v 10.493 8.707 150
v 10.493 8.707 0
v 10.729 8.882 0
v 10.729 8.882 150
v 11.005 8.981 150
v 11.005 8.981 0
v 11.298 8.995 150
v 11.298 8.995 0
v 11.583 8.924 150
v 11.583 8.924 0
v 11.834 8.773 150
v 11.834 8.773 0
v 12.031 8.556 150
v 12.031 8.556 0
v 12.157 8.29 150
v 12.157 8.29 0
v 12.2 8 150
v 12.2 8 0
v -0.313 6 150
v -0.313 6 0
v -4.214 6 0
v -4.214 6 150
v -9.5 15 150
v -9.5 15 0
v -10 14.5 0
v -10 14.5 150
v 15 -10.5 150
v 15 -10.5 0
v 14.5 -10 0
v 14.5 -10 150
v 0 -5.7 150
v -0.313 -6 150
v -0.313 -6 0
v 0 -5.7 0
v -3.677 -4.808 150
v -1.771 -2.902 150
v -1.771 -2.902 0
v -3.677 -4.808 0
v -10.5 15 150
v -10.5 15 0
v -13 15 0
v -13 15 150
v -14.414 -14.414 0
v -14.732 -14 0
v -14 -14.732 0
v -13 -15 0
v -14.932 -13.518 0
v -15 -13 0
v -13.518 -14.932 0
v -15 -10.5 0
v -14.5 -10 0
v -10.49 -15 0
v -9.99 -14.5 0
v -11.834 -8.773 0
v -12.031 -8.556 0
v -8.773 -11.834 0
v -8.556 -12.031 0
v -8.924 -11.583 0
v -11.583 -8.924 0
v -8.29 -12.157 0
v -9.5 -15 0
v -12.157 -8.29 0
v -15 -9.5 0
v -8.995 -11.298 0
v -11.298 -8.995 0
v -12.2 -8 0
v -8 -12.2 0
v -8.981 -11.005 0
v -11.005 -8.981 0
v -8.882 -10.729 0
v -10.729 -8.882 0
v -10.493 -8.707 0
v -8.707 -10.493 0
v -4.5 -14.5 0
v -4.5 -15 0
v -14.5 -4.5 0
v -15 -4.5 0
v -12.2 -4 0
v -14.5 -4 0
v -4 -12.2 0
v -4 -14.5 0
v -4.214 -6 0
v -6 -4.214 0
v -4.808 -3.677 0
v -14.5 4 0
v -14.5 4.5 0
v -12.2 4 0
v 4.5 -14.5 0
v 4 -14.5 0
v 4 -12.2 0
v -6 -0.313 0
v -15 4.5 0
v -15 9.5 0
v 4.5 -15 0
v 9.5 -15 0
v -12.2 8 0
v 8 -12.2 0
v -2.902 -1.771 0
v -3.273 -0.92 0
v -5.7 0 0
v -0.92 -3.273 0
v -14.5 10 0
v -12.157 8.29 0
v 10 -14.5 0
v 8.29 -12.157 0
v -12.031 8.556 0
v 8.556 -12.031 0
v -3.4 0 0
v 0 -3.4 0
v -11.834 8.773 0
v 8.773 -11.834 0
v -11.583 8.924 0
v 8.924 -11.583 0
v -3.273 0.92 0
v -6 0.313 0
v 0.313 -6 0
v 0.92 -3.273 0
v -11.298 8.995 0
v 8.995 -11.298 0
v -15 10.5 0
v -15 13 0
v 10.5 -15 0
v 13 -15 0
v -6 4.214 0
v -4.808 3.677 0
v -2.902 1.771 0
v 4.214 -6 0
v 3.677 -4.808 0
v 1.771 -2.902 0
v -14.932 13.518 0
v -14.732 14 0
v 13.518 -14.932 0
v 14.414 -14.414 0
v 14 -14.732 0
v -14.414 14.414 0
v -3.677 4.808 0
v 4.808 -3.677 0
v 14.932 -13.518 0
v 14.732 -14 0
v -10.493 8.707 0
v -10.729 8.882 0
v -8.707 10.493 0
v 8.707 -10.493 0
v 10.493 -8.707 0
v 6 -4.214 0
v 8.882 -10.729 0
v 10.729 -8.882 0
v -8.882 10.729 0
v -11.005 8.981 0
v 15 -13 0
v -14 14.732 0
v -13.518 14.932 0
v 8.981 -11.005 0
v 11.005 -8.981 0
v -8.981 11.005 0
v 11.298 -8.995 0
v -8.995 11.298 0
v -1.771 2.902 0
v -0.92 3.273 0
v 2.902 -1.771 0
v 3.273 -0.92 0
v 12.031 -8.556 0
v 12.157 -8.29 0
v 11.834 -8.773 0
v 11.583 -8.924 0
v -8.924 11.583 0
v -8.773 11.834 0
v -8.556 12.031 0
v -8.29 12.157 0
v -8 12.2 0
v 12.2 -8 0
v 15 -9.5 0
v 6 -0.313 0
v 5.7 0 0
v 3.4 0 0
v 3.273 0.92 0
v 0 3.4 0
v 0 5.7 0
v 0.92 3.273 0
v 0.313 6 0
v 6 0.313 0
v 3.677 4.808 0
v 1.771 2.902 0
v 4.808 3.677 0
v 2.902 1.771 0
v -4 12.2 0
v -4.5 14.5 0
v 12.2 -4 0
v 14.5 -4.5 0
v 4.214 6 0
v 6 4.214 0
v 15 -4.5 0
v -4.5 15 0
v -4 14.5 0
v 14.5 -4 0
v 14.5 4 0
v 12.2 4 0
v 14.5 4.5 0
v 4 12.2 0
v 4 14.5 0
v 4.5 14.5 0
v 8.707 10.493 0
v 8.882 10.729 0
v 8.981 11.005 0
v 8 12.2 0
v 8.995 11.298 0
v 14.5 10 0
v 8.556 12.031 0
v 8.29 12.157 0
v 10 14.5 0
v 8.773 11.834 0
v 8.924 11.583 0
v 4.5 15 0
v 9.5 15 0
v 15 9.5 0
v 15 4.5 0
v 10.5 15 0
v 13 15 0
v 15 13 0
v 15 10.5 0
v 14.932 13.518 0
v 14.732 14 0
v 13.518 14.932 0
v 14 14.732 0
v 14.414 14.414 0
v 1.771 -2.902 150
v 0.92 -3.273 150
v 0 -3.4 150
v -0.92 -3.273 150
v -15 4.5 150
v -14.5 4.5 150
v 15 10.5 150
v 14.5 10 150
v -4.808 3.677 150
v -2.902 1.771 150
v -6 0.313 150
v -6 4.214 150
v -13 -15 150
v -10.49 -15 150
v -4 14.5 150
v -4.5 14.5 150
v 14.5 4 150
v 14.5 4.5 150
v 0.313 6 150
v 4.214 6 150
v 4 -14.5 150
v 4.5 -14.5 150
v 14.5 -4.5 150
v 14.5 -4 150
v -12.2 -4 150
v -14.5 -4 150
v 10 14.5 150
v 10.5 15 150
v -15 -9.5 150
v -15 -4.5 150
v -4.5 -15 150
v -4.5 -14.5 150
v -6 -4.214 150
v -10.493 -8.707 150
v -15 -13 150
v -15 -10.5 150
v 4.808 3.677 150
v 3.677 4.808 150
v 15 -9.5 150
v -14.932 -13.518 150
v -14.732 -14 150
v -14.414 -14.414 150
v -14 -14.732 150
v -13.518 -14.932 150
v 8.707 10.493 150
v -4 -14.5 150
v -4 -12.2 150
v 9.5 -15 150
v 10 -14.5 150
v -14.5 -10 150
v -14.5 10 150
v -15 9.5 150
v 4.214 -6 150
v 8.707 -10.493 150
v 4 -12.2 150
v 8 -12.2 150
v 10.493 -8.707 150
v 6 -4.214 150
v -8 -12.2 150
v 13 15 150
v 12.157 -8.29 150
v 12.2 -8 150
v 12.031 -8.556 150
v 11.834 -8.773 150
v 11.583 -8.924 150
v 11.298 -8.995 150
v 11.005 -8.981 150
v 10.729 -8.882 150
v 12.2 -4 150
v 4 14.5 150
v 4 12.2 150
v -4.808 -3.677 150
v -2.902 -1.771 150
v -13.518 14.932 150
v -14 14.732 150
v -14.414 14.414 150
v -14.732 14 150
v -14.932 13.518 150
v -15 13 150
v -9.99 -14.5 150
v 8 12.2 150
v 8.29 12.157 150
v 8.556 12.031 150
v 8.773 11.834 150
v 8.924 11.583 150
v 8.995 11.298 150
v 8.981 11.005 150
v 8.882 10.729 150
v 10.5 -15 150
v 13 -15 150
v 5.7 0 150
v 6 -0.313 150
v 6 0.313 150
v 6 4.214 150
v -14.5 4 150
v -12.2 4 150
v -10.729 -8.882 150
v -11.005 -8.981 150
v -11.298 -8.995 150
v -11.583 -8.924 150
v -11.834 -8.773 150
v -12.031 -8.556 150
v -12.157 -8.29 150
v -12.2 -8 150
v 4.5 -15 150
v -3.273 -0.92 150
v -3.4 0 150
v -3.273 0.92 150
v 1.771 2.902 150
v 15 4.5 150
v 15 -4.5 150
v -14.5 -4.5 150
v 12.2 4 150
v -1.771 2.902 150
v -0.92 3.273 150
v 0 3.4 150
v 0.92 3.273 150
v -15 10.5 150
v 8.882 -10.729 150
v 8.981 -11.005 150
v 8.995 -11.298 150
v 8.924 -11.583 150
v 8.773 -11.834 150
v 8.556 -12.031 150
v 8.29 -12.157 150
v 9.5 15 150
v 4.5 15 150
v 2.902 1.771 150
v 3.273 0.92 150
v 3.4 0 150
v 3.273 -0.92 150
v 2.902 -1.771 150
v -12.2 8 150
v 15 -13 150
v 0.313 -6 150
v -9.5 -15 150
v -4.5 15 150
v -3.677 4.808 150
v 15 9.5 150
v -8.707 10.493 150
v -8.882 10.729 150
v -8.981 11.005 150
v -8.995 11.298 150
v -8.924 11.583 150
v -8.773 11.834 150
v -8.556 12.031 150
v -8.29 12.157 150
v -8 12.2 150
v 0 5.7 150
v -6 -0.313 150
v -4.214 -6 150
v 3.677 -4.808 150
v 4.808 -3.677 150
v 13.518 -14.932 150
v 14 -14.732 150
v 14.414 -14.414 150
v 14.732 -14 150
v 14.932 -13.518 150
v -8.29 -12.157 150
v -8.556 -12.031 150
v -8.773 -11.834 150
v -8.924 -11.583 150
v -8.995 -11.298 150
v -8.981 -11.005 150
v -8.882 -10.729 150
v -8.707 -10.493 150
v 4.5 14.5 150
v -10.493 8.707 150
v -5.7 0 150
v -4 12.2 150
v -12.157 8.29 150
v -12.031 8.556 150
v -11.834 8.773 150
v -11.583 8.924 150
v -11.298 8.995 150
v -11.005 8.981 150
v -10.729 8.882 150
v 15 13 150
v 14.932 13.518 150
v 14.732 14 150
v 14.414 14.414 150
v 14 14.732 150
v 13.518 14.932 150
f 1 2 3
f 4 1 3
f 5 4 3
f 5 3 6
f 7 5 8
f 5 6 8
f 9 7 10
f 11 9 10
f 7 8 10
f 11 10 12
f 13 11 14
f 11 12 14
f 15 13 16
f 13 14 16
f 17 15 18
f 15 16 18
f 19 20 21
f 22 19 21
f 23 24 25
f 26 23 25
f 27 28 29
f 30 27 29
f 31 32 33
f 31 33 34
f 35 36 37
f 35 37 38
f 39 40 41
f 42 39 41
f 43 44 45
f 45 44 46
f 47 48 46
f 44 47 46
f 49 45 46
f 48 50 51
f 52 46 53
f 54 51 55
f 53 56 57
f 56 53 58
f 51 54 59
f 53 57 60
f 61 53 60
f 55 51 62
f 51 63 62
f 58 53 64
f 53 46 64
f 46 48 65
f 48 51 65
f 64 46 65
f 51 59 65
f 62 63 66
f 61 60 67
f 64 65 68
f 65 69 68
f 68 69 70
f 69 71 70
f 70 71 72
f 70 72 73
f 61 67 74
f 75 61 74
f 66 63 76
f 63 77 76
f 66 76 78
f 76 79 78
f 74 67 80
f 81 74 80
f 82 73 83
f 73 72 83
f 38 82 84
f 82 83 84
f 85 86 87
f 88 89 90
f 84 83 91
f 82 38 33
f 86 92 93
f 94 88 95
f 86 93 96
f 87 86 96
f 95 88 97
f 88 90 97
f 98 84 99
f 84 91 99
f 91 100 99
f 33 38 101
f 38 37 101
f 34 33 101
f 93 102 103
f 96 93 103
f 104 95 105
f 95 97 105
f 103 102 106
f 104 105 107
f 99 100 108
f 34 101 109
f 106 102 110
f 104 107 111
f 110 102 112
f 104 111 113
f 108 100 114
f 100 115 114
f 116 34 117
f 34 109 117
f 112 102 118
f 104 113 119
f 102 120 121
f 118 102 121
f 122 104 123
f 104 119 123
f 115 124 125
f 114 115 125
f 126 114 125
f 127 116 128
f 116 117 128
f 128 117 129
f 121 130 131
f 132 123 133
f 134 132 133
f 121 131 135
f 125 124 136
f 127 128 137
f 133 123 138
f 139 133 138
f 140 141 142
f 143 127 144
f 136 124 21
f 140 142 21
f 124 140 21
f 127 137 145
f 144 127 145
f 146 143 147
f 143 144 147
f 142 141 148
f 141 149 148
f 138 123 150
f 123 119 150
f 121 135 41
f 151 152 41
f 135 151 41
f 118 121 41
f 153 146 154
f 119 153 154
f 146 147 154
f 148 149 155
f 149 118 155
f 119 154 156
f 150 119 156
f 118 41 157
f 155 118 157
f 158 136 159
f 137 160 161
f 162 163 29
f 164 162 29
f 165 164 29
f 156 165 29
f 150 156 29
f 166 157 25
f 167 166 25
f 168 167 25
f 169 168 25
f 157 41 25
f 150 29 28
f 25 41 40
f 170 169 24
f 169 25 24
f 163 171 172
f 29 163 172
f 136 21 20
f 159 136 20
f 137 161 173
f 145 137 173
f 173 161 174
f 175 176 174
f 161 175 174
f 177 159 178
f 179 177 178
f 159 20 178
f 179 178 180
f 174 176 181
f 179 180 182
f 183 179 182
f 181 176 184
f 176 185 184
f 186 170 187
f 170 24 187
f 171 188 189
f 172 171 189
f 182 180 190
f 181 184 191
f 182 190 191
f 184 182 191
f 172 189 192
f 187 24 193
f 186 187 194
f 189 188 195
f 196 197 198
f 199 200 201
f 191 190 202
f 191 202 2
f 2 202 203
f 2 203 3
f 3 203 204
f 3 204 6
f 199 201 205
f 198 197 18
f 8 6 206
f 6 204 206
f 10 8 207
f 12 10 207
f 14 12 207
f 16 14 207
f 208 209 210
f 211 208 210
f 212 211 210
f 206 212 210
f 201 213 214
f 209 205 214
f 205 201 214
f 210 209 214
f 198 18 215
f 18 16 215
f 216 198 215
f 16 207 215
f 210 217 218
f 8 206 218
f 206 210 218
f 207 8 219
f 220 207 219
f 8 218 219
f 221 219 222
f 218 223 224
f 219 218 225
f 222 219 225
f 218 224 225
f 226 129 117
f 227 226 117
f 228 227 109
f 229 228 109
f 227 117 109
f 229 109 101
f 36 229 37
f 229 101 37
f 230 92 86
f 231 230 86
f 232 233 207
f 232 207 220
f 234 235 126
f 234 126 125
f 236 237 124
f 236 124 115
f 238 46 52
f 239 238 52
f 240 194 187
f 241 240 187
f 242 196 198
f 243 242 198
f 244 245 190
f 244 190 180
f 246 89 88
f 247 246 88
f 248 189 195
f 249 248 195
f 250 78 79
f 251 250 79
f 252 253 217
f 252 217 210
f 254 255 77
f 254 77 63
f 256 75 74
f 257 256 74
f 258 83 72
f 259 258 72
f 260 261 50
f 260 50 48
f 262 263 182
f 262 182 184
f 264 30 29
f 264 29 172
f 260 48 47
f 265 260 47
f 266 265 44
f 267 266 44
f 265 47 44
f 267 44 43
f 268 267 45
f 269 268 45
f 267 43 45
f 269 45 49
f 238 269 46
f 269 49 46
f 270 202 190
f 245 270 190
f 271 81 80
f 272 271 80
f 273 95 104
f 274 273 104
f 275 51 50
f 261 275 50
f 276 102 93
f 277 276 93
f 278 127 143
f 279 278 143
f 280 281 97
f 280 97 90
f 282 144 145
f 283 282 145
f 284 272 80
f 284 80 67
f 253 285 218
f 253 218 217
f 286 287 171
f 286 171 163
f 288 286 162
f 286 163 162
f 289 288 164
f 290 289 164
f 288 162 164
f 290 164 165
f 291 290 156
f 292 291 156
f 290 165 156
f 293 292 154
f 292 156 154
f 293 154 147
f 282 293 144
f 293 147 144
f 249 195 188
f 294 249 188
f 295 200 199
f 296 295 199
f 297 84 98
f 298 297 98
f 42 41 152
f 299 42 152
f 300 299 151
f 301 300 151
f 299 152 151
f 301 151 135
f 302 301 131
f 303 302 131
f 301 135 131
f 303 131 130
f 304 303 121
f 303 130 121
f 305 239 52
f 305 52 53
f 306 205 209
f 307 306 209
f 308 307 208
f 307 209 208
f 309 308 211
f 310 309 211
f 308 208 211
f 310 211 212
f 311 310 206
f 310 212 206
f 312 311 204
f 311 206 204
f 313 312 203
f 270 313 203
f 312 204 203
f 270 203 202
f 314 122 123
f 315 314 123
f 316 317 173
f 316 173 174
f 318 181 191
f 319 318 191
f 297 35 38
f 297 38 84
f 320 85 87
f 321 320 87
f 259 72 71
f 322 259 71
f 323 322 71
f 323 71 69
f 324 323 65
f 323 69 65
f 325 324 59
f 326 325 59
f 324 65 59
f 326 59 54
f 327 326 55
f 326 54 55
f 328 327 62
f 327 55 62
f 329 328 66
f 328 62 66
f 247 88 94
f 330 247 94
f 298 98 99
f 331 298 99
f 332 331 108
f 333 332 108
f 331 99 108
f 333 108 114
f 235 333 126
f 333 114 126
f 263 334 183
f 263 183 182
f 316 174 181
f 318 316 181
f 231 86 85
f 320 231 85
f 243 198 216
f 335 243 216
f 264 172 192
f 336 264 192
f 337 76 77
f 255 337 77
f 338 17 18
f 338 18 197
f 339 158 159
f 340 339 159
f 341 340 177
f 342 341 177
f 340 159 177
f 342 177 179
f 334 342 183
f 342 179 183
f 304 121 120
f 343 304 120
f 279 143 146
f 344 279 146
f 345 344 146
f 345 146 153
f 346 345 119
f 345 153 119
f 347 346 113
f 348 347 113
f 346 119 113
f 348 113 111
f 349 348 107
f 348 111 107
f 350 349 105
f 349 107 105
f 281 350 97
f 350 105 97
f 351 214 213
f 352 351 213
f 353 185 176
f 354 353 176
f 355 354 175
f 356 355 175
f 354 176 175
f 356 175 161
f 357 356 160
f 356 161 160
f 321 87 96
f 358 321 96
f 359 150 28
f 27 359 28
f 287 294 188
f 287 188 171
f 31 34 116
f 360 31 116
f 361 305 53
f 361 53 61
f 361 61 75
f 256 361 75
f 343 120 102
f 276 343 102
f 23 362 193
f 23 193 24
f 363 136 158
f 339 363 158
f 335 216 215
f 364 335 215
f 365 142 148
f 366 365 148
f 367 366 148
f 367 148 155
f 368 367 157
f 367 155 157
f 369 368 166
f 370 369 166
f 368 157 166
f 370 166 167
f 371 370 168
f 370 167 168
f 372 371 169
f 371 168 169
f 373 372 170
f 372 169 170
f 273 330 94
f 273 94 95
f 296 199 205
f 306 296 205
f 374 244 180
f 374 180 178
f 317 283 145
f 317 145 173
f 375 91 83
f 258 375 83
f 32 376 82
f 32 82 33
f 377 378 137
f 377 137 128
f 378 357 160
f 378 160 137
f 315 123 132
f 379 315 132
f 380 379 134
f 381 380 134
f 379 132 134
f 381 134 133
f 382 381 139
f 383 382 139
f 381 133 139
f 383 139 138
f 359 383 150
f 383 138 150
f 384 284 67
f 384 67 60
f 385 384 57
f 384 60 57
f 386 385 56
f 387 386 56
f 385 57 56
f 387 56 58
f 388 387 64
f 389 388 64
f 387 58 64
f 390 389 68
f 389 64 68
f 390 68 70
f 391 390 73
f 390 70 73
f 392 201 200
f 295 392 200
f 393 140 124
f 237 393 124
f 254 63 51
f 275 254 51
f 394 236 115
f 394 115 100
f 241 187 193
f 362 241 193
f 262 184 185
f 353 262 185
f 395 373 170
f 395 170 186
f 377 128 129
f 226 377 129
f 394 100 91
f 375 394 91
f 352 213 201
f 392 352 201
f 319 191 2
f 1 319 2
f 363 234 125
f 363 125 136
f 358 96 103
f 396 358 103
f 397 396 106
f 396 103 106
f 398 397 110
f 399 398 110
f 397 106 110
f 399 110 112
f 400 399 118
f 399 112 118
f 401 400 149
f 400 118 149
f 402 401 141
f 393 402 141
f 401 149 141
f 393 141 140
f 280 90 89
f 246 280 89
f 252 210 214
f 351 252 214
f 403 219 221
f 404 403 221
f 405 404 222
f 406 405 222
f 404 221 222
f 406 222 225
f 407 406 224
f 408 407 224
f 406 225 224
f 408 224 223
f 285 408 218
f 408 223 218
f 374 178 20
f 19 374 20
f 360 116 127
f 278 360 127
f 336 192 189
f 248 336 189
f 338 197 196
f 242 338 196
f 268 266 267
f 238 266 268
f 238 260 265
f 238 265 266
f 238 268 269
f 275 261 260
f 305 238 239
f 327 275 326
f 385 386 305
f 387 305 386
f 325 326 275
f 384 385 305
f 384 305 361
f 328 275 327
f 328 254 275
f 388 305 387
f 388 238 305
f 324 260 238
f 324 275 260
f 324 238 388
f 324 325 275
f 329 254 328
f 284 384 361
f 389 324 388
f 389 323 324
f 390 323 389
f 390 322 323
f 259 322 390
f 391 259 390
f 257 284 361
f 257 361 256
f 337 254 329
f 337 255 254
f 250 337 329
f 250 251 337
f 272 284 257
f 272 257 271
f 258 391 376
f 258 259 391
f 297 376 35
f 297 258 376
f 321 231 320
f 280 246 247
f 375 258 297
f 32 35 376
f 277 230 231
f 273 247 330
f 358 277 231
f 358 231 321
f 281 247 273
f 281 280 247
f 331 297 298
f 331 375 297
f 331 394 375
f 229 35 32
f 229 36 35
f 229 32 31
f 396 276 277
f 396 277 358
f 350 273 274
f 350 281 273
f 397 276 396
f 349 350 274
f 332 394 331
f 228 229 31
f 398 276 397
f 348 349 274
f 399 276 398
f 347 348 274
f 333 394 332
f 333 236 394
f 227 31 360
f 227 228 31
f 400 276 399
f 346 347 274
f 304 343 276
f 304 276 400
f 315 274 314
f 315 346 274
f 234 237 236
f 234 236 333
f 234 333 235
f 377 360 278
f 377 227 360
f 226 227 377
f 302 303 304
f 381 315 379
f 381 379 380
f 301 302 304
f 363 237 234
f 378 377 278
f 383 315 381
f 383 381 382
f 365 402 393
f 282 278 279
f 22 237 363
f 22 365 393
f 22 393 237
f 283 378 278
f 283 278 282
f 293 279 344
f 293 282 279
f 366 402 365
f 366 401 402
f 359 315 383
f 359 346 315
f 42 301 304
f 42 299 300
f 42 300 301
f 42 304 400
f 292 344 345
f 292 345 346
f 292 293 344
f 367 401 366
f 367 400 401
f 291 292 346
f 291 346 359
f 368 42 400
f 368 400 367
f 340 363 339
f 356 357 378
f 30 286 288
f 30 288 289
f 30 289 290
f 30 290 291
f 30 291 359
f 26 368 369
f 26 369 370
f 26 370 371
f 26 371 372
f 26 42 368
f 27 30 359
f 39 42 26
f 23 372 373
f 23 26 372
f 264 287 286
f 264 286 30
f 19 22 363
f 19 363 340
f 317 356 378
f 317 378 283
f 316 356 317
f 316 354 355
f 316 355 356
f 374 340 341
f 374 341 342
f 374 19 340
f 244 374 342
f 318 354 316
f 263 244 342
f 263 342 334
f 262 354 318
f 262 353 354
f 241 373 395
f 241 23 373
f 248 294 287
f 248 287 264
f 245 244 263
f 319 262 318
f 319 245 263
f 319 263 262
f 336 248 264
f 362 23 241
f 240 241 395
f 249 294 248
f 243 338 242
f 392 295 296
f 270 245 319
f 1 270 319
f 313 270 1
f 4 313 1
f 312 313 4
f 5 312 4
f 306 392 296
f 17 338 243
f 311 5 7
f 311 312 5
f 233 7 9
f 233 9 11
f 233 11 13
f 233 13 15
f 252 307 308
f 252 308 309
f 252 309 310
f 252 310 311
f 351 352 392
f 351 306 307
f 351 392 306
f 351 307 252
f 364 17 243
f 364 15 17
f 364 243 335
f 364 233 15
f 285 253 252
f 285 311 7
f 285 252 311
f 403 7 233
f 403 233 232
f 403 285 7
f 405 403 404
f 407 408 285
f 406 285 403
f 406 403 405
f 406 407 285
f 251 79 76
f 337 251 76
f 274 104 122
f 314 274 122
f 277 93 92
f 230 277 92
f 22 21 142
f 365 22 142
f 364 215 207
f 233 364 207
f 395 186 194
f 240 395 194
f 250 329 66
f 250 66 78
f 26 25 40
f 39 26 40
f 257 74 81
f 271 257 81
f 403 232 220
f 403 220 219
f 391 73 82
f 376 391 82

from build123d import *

# Parameters (mm, degrees)
BOSS_EXTRUDE1_DEPTH = 150


with BuildPart() as part:
    # Sketch1 → Boss-Extrude1 (new body)
    with BuildSketch(Plane.XY):
        with BuildLine():
            Line((12.999999999, 14.999999999), (10.499999999, 14.999999999))
            Line((10.499999999, 14.999999999), (9.999999999, 14.499999999))
            Line((9.999999999, 14.499999999), (9.5, 14.999999999))
            Line((9.5, 14.999999999), (4.5, 14.999999999))
            Line((4.5, 14.999999999), (4.5, 14.5))
            Line((4.5, 14.5), (4, 14.5))
            Line((4, 14.5), (4, 12.200000005))
            Line((4, 12.200000005), (7.999999994, 12.200000005))
            ThreePointArc((7.999999994, 12.200000005), (8.923879532, 11.582683434), (8.707106779, 10.492893215))
            Line((8.707106779, 10.492893215), (4.214213564, 6))
            Line((4.214213564, 6), (0.312520901, 6))
            Line((0.312520901, 6), (0, 5.7))
            Line((0, 5.7), (-0.312520903, 6))
            Line((-0.312520903, 6), (-4.214213564, 6))
            Line((-4.214213564, 6), (-8.70710678, 10.492893215))
            ThreePointArc((-8.70710678, 10.492893215), (-8.923879532, 11.582683434), (-7.999999995, 12.200000005))
            Line((-7.999999995, 12.200000005), (-4, 12.200000005))
            Line((-4, 12.200000005), (-4, 14.5))
            Line((-4, 14.5), (-4.5, 14.5))
            Line((-4.5, 14.5), (-4.5, 14.999999999))
            Line((-4.5, 14.999999999), (-9.500000003, 14.999999999))
            Line((-9.500000003, 14.999999999), (-10.000000002, 14.499999999))
            Line((-10.000000002, 14.499999999), (-10.500000001, 14.999999999))
            Line((-10.500000001, 14.999999999), (-13, 14.999999999))
            ThreePointArc((-13, 14.999999999), (-14.414213562, 14.414213561), (-15, 12.999999999))
            Line((-15, 12.999999999), (-15, 10.5))
            Line((-15, 10.5), (-14.500000001, 10.000000001))
            Line((-14.500000001, 10.000000001), (-15, 9.500000001))
            Line((-15, 9.500000001), (-15, 4.5))
            Line((-15, 4.5), (-14.5, 4.5))
            Line((-14.5, 4.5), (-14.5, 4))
            Line((-14.5, 4), (-12.200000005, 4))
            Line((-12.200000005, 4), (-12.200000005, 7.999999994))
            ThreePointArc((-12.200000005, 7.999999994), (-11.582683434, 8.923879532), (-10.492893215, 8.707106779))
            Line((-10.492893215, 8.707106779), (-6, 4.214213564))
            Line((-6, 4.214213564), (-6, 0.312520901))
            Line((-6, 0.312520901), (-5.7, 0))
            Line((-5.7, 0), (-6, -0.312520903))
            Line((-6, -0.312520903), (-6, -4.214213564))
            Line((-6, -4.214213564), (-10.492893215, -8.70710678))
            ThreePointArc((-10.492893215, -8.70710678), (-11.582683434, -8.923879532), (-12.200000005, -7.999999995))
            Line((-12.200000005, -7.999999995), (-12.200000005, -4))
            Line((-12.200000005, -4), (-14.5, -4))
            Line((-14.5, -4), (-14.5, -4.5))
            Line((-14.5, -4.5), (-15, -4.5))
            Line((-15, -4.5), (-15, -9.500000001))
            Line((-15, -9.500000001), (-14.500000001, -10.000000001))
            Line((-14.500000001, -10.000000001), (-15, -10.5))
            Line((-15, -10.5), (-15, -13))
            ThreePointArc((-15, -13), (-14.414213562, -14.414213562), (-13, -15))
            Line((-13, -15), (-10.489897949, -15))
            Line((-10.489897949, -15), (-9.989897949, -14.5))
            Line((-9.989897949, -14.5), (-9.500000001, -15))
            Line((-9.500000001, -15), (-4.5, -15))
            Line((-4.5, -15), (-4.5, -14.5))
            Line((-4.5, -14.5), (-4, -14.5))
            Line((-4, -14.5), (-4, -12.200000005))
            Line((-4, -12.200000005), (-7.999999995, -12.200000005))
            ThreePointArc((-7.999999995, -12.200000005), (-8.923879532, -11.582683434), (-8.70710678, -10.492893215))
            Line((-8.70710678, -10.492893215), (-4.214213564, -6))
            Line((-4.214213564, -6), (-0.312520901, -6))
            Line((-0.312520901, -6), (0, -5.7))
            Line((0, -5.7), (0.312520903, -6))
            Line((0.312520903, -6), (4.214213564, -6))
            Line((4.214213564, -6), (8.70710678, -10.492893215))
            ThreePointArc((8.70710678, -10.492893215), (8.923879532, -11.582683434), (7.999999995, -12.200000005))
            Line((7.999999995, -12.200000005), (4, -12.200000005))
            Line((4, -12.200000005), (4, -14.5))
            Line((4, -14.5), (4.5, -14.5))
            Line((4.5, -14.5), (4.5, -15))
            Line((4.5, -15), (9.500000001, -15))
            Line((9.500000001, -15), (10.000000001, -14.500000001))
            Line((10.000000001, -14.500000001), (10.5, -15))
            Line((10.5, -15), (12.999999999, -15))
            ThreePointArc((12.999999999, -15), (14.414213561, -14.414213562), (14.999999999, -13))
            Line((14.999999999, -13), (14.999999999, -10.500000001))
            Line((14.999999999, -10.500000001), (14.499999999, -10.000000002))
            Line((14.499999999, -10.000000002), (14.999999999, -9.500000002))
            Line((14.999999999, -9.500000002), (14.999999999, -4.5))
            Line((14.999999999, -4.5), (14.5, -4.5))
            Line((14.5, -4.5), (14.5, -4))
            Line((14.5, -4), (12.200000005, -4))
            Line((12.200000005, -4), (12.200000005, -7.999999995))
            ThreePointArc((12.200000005, -7.999999995), (11.582683434, -8.923879532), (10.492893215, -8.70710678))
            Line((10.492893215, -8.70710678), (6, -4.214213564))
            Line((6, -4.214213564), (6, -0.312520901))
            Line((6, -0.312520901), (5.7, 0))
            Line((5.7, 0), (6, 0.312520903))
            Line((6, 0.312520903), (6, 4.214213564))
            Line((6, 4.214213564), (10.492893215, 8.70710678))
            ThreePointArc((10.492893215, 8.70710678), (11.582683434, 8.923879532), (12.200000005, 7.999999995))
            Line((12.200000005, 7.999999995), (12.200000005, 4))
            Line((12.200000005, 4), (14.5, 4))
            Line((14.5, 4), (14.5, 4.5))
            Line((14.5, 4.5), (14.999999999, 4.5))
            Line((14.999999999, 4.5), (14.999999999, 9.5))
            Line((14.999999999, 9.5), (14.499999999, 9.999999999))
            Line((14.499999999, 9.999999999), (14.999999999, 10.499999999))
            Line((14.999999999, 10.499999999), (14.999999999, 12.999999999))
            ThreePointArc((14.999999999, 12.999999999), (14.414213561, 14.414213561), (12.999999999, 14.999999999))
        make_face()
        with BuildLine():
            Line((-2.902349714, 1.770978864), (-4.808326112, 3.676955262))
            Line((-4.808326112, 3.676955262), (-3.676955262, 4.808326112))
            Line((-3.676955262, 4.808326112), (-1.770978864, 2.902349714))
            ThreePointArc((-1.770978864, 2.902349714), (0, 3.4), (1.770978864, 2.902349714))
            Line((1.770978864, 2.902349714), (3.676955262, 4.808326112))
            Line((3.676955262, 4.808326112), (4.808326112, 3.676955262))
            Line((4.808326112, 3.676955262), (2.902349714, 1.770978864))
            ThreePointArc((2.902349714, 1.770978864), (3.4, 0), (2.902349714, -1.770978864))
            Line((2.902349714, -1.770978864), (4.808326112, -3.676955262))
            Line((4.808326112, -3.676955262), (3.676955262, -4.808326112))
            Line((3.676955262, -4.808326112), (1.770978864, -2.902349714))
            ThreePointArc((1.770978864, -2.902349714), (0, -3.4), (-1.770978864, -2.902349714))
            Line((-1.770978864, -2.902349714), (-3.676955262, -4.808326112))
            Line((-3.676955262, -4.808326112), (-4.808326112, -3.676955262))
            Line((-4.808326112, -3.676955262), (-2.902349714, -1.770978864))
            ThreePointArc((-2.902349714, -1.770978864), (-3.4, 0), (-2.902349714, 1.770978864))
        make_face(mode=Mode.SUBTRACT)
    extrude(amount=BOSS_EXTRUDE1_DEPTH)


solid = part.part
